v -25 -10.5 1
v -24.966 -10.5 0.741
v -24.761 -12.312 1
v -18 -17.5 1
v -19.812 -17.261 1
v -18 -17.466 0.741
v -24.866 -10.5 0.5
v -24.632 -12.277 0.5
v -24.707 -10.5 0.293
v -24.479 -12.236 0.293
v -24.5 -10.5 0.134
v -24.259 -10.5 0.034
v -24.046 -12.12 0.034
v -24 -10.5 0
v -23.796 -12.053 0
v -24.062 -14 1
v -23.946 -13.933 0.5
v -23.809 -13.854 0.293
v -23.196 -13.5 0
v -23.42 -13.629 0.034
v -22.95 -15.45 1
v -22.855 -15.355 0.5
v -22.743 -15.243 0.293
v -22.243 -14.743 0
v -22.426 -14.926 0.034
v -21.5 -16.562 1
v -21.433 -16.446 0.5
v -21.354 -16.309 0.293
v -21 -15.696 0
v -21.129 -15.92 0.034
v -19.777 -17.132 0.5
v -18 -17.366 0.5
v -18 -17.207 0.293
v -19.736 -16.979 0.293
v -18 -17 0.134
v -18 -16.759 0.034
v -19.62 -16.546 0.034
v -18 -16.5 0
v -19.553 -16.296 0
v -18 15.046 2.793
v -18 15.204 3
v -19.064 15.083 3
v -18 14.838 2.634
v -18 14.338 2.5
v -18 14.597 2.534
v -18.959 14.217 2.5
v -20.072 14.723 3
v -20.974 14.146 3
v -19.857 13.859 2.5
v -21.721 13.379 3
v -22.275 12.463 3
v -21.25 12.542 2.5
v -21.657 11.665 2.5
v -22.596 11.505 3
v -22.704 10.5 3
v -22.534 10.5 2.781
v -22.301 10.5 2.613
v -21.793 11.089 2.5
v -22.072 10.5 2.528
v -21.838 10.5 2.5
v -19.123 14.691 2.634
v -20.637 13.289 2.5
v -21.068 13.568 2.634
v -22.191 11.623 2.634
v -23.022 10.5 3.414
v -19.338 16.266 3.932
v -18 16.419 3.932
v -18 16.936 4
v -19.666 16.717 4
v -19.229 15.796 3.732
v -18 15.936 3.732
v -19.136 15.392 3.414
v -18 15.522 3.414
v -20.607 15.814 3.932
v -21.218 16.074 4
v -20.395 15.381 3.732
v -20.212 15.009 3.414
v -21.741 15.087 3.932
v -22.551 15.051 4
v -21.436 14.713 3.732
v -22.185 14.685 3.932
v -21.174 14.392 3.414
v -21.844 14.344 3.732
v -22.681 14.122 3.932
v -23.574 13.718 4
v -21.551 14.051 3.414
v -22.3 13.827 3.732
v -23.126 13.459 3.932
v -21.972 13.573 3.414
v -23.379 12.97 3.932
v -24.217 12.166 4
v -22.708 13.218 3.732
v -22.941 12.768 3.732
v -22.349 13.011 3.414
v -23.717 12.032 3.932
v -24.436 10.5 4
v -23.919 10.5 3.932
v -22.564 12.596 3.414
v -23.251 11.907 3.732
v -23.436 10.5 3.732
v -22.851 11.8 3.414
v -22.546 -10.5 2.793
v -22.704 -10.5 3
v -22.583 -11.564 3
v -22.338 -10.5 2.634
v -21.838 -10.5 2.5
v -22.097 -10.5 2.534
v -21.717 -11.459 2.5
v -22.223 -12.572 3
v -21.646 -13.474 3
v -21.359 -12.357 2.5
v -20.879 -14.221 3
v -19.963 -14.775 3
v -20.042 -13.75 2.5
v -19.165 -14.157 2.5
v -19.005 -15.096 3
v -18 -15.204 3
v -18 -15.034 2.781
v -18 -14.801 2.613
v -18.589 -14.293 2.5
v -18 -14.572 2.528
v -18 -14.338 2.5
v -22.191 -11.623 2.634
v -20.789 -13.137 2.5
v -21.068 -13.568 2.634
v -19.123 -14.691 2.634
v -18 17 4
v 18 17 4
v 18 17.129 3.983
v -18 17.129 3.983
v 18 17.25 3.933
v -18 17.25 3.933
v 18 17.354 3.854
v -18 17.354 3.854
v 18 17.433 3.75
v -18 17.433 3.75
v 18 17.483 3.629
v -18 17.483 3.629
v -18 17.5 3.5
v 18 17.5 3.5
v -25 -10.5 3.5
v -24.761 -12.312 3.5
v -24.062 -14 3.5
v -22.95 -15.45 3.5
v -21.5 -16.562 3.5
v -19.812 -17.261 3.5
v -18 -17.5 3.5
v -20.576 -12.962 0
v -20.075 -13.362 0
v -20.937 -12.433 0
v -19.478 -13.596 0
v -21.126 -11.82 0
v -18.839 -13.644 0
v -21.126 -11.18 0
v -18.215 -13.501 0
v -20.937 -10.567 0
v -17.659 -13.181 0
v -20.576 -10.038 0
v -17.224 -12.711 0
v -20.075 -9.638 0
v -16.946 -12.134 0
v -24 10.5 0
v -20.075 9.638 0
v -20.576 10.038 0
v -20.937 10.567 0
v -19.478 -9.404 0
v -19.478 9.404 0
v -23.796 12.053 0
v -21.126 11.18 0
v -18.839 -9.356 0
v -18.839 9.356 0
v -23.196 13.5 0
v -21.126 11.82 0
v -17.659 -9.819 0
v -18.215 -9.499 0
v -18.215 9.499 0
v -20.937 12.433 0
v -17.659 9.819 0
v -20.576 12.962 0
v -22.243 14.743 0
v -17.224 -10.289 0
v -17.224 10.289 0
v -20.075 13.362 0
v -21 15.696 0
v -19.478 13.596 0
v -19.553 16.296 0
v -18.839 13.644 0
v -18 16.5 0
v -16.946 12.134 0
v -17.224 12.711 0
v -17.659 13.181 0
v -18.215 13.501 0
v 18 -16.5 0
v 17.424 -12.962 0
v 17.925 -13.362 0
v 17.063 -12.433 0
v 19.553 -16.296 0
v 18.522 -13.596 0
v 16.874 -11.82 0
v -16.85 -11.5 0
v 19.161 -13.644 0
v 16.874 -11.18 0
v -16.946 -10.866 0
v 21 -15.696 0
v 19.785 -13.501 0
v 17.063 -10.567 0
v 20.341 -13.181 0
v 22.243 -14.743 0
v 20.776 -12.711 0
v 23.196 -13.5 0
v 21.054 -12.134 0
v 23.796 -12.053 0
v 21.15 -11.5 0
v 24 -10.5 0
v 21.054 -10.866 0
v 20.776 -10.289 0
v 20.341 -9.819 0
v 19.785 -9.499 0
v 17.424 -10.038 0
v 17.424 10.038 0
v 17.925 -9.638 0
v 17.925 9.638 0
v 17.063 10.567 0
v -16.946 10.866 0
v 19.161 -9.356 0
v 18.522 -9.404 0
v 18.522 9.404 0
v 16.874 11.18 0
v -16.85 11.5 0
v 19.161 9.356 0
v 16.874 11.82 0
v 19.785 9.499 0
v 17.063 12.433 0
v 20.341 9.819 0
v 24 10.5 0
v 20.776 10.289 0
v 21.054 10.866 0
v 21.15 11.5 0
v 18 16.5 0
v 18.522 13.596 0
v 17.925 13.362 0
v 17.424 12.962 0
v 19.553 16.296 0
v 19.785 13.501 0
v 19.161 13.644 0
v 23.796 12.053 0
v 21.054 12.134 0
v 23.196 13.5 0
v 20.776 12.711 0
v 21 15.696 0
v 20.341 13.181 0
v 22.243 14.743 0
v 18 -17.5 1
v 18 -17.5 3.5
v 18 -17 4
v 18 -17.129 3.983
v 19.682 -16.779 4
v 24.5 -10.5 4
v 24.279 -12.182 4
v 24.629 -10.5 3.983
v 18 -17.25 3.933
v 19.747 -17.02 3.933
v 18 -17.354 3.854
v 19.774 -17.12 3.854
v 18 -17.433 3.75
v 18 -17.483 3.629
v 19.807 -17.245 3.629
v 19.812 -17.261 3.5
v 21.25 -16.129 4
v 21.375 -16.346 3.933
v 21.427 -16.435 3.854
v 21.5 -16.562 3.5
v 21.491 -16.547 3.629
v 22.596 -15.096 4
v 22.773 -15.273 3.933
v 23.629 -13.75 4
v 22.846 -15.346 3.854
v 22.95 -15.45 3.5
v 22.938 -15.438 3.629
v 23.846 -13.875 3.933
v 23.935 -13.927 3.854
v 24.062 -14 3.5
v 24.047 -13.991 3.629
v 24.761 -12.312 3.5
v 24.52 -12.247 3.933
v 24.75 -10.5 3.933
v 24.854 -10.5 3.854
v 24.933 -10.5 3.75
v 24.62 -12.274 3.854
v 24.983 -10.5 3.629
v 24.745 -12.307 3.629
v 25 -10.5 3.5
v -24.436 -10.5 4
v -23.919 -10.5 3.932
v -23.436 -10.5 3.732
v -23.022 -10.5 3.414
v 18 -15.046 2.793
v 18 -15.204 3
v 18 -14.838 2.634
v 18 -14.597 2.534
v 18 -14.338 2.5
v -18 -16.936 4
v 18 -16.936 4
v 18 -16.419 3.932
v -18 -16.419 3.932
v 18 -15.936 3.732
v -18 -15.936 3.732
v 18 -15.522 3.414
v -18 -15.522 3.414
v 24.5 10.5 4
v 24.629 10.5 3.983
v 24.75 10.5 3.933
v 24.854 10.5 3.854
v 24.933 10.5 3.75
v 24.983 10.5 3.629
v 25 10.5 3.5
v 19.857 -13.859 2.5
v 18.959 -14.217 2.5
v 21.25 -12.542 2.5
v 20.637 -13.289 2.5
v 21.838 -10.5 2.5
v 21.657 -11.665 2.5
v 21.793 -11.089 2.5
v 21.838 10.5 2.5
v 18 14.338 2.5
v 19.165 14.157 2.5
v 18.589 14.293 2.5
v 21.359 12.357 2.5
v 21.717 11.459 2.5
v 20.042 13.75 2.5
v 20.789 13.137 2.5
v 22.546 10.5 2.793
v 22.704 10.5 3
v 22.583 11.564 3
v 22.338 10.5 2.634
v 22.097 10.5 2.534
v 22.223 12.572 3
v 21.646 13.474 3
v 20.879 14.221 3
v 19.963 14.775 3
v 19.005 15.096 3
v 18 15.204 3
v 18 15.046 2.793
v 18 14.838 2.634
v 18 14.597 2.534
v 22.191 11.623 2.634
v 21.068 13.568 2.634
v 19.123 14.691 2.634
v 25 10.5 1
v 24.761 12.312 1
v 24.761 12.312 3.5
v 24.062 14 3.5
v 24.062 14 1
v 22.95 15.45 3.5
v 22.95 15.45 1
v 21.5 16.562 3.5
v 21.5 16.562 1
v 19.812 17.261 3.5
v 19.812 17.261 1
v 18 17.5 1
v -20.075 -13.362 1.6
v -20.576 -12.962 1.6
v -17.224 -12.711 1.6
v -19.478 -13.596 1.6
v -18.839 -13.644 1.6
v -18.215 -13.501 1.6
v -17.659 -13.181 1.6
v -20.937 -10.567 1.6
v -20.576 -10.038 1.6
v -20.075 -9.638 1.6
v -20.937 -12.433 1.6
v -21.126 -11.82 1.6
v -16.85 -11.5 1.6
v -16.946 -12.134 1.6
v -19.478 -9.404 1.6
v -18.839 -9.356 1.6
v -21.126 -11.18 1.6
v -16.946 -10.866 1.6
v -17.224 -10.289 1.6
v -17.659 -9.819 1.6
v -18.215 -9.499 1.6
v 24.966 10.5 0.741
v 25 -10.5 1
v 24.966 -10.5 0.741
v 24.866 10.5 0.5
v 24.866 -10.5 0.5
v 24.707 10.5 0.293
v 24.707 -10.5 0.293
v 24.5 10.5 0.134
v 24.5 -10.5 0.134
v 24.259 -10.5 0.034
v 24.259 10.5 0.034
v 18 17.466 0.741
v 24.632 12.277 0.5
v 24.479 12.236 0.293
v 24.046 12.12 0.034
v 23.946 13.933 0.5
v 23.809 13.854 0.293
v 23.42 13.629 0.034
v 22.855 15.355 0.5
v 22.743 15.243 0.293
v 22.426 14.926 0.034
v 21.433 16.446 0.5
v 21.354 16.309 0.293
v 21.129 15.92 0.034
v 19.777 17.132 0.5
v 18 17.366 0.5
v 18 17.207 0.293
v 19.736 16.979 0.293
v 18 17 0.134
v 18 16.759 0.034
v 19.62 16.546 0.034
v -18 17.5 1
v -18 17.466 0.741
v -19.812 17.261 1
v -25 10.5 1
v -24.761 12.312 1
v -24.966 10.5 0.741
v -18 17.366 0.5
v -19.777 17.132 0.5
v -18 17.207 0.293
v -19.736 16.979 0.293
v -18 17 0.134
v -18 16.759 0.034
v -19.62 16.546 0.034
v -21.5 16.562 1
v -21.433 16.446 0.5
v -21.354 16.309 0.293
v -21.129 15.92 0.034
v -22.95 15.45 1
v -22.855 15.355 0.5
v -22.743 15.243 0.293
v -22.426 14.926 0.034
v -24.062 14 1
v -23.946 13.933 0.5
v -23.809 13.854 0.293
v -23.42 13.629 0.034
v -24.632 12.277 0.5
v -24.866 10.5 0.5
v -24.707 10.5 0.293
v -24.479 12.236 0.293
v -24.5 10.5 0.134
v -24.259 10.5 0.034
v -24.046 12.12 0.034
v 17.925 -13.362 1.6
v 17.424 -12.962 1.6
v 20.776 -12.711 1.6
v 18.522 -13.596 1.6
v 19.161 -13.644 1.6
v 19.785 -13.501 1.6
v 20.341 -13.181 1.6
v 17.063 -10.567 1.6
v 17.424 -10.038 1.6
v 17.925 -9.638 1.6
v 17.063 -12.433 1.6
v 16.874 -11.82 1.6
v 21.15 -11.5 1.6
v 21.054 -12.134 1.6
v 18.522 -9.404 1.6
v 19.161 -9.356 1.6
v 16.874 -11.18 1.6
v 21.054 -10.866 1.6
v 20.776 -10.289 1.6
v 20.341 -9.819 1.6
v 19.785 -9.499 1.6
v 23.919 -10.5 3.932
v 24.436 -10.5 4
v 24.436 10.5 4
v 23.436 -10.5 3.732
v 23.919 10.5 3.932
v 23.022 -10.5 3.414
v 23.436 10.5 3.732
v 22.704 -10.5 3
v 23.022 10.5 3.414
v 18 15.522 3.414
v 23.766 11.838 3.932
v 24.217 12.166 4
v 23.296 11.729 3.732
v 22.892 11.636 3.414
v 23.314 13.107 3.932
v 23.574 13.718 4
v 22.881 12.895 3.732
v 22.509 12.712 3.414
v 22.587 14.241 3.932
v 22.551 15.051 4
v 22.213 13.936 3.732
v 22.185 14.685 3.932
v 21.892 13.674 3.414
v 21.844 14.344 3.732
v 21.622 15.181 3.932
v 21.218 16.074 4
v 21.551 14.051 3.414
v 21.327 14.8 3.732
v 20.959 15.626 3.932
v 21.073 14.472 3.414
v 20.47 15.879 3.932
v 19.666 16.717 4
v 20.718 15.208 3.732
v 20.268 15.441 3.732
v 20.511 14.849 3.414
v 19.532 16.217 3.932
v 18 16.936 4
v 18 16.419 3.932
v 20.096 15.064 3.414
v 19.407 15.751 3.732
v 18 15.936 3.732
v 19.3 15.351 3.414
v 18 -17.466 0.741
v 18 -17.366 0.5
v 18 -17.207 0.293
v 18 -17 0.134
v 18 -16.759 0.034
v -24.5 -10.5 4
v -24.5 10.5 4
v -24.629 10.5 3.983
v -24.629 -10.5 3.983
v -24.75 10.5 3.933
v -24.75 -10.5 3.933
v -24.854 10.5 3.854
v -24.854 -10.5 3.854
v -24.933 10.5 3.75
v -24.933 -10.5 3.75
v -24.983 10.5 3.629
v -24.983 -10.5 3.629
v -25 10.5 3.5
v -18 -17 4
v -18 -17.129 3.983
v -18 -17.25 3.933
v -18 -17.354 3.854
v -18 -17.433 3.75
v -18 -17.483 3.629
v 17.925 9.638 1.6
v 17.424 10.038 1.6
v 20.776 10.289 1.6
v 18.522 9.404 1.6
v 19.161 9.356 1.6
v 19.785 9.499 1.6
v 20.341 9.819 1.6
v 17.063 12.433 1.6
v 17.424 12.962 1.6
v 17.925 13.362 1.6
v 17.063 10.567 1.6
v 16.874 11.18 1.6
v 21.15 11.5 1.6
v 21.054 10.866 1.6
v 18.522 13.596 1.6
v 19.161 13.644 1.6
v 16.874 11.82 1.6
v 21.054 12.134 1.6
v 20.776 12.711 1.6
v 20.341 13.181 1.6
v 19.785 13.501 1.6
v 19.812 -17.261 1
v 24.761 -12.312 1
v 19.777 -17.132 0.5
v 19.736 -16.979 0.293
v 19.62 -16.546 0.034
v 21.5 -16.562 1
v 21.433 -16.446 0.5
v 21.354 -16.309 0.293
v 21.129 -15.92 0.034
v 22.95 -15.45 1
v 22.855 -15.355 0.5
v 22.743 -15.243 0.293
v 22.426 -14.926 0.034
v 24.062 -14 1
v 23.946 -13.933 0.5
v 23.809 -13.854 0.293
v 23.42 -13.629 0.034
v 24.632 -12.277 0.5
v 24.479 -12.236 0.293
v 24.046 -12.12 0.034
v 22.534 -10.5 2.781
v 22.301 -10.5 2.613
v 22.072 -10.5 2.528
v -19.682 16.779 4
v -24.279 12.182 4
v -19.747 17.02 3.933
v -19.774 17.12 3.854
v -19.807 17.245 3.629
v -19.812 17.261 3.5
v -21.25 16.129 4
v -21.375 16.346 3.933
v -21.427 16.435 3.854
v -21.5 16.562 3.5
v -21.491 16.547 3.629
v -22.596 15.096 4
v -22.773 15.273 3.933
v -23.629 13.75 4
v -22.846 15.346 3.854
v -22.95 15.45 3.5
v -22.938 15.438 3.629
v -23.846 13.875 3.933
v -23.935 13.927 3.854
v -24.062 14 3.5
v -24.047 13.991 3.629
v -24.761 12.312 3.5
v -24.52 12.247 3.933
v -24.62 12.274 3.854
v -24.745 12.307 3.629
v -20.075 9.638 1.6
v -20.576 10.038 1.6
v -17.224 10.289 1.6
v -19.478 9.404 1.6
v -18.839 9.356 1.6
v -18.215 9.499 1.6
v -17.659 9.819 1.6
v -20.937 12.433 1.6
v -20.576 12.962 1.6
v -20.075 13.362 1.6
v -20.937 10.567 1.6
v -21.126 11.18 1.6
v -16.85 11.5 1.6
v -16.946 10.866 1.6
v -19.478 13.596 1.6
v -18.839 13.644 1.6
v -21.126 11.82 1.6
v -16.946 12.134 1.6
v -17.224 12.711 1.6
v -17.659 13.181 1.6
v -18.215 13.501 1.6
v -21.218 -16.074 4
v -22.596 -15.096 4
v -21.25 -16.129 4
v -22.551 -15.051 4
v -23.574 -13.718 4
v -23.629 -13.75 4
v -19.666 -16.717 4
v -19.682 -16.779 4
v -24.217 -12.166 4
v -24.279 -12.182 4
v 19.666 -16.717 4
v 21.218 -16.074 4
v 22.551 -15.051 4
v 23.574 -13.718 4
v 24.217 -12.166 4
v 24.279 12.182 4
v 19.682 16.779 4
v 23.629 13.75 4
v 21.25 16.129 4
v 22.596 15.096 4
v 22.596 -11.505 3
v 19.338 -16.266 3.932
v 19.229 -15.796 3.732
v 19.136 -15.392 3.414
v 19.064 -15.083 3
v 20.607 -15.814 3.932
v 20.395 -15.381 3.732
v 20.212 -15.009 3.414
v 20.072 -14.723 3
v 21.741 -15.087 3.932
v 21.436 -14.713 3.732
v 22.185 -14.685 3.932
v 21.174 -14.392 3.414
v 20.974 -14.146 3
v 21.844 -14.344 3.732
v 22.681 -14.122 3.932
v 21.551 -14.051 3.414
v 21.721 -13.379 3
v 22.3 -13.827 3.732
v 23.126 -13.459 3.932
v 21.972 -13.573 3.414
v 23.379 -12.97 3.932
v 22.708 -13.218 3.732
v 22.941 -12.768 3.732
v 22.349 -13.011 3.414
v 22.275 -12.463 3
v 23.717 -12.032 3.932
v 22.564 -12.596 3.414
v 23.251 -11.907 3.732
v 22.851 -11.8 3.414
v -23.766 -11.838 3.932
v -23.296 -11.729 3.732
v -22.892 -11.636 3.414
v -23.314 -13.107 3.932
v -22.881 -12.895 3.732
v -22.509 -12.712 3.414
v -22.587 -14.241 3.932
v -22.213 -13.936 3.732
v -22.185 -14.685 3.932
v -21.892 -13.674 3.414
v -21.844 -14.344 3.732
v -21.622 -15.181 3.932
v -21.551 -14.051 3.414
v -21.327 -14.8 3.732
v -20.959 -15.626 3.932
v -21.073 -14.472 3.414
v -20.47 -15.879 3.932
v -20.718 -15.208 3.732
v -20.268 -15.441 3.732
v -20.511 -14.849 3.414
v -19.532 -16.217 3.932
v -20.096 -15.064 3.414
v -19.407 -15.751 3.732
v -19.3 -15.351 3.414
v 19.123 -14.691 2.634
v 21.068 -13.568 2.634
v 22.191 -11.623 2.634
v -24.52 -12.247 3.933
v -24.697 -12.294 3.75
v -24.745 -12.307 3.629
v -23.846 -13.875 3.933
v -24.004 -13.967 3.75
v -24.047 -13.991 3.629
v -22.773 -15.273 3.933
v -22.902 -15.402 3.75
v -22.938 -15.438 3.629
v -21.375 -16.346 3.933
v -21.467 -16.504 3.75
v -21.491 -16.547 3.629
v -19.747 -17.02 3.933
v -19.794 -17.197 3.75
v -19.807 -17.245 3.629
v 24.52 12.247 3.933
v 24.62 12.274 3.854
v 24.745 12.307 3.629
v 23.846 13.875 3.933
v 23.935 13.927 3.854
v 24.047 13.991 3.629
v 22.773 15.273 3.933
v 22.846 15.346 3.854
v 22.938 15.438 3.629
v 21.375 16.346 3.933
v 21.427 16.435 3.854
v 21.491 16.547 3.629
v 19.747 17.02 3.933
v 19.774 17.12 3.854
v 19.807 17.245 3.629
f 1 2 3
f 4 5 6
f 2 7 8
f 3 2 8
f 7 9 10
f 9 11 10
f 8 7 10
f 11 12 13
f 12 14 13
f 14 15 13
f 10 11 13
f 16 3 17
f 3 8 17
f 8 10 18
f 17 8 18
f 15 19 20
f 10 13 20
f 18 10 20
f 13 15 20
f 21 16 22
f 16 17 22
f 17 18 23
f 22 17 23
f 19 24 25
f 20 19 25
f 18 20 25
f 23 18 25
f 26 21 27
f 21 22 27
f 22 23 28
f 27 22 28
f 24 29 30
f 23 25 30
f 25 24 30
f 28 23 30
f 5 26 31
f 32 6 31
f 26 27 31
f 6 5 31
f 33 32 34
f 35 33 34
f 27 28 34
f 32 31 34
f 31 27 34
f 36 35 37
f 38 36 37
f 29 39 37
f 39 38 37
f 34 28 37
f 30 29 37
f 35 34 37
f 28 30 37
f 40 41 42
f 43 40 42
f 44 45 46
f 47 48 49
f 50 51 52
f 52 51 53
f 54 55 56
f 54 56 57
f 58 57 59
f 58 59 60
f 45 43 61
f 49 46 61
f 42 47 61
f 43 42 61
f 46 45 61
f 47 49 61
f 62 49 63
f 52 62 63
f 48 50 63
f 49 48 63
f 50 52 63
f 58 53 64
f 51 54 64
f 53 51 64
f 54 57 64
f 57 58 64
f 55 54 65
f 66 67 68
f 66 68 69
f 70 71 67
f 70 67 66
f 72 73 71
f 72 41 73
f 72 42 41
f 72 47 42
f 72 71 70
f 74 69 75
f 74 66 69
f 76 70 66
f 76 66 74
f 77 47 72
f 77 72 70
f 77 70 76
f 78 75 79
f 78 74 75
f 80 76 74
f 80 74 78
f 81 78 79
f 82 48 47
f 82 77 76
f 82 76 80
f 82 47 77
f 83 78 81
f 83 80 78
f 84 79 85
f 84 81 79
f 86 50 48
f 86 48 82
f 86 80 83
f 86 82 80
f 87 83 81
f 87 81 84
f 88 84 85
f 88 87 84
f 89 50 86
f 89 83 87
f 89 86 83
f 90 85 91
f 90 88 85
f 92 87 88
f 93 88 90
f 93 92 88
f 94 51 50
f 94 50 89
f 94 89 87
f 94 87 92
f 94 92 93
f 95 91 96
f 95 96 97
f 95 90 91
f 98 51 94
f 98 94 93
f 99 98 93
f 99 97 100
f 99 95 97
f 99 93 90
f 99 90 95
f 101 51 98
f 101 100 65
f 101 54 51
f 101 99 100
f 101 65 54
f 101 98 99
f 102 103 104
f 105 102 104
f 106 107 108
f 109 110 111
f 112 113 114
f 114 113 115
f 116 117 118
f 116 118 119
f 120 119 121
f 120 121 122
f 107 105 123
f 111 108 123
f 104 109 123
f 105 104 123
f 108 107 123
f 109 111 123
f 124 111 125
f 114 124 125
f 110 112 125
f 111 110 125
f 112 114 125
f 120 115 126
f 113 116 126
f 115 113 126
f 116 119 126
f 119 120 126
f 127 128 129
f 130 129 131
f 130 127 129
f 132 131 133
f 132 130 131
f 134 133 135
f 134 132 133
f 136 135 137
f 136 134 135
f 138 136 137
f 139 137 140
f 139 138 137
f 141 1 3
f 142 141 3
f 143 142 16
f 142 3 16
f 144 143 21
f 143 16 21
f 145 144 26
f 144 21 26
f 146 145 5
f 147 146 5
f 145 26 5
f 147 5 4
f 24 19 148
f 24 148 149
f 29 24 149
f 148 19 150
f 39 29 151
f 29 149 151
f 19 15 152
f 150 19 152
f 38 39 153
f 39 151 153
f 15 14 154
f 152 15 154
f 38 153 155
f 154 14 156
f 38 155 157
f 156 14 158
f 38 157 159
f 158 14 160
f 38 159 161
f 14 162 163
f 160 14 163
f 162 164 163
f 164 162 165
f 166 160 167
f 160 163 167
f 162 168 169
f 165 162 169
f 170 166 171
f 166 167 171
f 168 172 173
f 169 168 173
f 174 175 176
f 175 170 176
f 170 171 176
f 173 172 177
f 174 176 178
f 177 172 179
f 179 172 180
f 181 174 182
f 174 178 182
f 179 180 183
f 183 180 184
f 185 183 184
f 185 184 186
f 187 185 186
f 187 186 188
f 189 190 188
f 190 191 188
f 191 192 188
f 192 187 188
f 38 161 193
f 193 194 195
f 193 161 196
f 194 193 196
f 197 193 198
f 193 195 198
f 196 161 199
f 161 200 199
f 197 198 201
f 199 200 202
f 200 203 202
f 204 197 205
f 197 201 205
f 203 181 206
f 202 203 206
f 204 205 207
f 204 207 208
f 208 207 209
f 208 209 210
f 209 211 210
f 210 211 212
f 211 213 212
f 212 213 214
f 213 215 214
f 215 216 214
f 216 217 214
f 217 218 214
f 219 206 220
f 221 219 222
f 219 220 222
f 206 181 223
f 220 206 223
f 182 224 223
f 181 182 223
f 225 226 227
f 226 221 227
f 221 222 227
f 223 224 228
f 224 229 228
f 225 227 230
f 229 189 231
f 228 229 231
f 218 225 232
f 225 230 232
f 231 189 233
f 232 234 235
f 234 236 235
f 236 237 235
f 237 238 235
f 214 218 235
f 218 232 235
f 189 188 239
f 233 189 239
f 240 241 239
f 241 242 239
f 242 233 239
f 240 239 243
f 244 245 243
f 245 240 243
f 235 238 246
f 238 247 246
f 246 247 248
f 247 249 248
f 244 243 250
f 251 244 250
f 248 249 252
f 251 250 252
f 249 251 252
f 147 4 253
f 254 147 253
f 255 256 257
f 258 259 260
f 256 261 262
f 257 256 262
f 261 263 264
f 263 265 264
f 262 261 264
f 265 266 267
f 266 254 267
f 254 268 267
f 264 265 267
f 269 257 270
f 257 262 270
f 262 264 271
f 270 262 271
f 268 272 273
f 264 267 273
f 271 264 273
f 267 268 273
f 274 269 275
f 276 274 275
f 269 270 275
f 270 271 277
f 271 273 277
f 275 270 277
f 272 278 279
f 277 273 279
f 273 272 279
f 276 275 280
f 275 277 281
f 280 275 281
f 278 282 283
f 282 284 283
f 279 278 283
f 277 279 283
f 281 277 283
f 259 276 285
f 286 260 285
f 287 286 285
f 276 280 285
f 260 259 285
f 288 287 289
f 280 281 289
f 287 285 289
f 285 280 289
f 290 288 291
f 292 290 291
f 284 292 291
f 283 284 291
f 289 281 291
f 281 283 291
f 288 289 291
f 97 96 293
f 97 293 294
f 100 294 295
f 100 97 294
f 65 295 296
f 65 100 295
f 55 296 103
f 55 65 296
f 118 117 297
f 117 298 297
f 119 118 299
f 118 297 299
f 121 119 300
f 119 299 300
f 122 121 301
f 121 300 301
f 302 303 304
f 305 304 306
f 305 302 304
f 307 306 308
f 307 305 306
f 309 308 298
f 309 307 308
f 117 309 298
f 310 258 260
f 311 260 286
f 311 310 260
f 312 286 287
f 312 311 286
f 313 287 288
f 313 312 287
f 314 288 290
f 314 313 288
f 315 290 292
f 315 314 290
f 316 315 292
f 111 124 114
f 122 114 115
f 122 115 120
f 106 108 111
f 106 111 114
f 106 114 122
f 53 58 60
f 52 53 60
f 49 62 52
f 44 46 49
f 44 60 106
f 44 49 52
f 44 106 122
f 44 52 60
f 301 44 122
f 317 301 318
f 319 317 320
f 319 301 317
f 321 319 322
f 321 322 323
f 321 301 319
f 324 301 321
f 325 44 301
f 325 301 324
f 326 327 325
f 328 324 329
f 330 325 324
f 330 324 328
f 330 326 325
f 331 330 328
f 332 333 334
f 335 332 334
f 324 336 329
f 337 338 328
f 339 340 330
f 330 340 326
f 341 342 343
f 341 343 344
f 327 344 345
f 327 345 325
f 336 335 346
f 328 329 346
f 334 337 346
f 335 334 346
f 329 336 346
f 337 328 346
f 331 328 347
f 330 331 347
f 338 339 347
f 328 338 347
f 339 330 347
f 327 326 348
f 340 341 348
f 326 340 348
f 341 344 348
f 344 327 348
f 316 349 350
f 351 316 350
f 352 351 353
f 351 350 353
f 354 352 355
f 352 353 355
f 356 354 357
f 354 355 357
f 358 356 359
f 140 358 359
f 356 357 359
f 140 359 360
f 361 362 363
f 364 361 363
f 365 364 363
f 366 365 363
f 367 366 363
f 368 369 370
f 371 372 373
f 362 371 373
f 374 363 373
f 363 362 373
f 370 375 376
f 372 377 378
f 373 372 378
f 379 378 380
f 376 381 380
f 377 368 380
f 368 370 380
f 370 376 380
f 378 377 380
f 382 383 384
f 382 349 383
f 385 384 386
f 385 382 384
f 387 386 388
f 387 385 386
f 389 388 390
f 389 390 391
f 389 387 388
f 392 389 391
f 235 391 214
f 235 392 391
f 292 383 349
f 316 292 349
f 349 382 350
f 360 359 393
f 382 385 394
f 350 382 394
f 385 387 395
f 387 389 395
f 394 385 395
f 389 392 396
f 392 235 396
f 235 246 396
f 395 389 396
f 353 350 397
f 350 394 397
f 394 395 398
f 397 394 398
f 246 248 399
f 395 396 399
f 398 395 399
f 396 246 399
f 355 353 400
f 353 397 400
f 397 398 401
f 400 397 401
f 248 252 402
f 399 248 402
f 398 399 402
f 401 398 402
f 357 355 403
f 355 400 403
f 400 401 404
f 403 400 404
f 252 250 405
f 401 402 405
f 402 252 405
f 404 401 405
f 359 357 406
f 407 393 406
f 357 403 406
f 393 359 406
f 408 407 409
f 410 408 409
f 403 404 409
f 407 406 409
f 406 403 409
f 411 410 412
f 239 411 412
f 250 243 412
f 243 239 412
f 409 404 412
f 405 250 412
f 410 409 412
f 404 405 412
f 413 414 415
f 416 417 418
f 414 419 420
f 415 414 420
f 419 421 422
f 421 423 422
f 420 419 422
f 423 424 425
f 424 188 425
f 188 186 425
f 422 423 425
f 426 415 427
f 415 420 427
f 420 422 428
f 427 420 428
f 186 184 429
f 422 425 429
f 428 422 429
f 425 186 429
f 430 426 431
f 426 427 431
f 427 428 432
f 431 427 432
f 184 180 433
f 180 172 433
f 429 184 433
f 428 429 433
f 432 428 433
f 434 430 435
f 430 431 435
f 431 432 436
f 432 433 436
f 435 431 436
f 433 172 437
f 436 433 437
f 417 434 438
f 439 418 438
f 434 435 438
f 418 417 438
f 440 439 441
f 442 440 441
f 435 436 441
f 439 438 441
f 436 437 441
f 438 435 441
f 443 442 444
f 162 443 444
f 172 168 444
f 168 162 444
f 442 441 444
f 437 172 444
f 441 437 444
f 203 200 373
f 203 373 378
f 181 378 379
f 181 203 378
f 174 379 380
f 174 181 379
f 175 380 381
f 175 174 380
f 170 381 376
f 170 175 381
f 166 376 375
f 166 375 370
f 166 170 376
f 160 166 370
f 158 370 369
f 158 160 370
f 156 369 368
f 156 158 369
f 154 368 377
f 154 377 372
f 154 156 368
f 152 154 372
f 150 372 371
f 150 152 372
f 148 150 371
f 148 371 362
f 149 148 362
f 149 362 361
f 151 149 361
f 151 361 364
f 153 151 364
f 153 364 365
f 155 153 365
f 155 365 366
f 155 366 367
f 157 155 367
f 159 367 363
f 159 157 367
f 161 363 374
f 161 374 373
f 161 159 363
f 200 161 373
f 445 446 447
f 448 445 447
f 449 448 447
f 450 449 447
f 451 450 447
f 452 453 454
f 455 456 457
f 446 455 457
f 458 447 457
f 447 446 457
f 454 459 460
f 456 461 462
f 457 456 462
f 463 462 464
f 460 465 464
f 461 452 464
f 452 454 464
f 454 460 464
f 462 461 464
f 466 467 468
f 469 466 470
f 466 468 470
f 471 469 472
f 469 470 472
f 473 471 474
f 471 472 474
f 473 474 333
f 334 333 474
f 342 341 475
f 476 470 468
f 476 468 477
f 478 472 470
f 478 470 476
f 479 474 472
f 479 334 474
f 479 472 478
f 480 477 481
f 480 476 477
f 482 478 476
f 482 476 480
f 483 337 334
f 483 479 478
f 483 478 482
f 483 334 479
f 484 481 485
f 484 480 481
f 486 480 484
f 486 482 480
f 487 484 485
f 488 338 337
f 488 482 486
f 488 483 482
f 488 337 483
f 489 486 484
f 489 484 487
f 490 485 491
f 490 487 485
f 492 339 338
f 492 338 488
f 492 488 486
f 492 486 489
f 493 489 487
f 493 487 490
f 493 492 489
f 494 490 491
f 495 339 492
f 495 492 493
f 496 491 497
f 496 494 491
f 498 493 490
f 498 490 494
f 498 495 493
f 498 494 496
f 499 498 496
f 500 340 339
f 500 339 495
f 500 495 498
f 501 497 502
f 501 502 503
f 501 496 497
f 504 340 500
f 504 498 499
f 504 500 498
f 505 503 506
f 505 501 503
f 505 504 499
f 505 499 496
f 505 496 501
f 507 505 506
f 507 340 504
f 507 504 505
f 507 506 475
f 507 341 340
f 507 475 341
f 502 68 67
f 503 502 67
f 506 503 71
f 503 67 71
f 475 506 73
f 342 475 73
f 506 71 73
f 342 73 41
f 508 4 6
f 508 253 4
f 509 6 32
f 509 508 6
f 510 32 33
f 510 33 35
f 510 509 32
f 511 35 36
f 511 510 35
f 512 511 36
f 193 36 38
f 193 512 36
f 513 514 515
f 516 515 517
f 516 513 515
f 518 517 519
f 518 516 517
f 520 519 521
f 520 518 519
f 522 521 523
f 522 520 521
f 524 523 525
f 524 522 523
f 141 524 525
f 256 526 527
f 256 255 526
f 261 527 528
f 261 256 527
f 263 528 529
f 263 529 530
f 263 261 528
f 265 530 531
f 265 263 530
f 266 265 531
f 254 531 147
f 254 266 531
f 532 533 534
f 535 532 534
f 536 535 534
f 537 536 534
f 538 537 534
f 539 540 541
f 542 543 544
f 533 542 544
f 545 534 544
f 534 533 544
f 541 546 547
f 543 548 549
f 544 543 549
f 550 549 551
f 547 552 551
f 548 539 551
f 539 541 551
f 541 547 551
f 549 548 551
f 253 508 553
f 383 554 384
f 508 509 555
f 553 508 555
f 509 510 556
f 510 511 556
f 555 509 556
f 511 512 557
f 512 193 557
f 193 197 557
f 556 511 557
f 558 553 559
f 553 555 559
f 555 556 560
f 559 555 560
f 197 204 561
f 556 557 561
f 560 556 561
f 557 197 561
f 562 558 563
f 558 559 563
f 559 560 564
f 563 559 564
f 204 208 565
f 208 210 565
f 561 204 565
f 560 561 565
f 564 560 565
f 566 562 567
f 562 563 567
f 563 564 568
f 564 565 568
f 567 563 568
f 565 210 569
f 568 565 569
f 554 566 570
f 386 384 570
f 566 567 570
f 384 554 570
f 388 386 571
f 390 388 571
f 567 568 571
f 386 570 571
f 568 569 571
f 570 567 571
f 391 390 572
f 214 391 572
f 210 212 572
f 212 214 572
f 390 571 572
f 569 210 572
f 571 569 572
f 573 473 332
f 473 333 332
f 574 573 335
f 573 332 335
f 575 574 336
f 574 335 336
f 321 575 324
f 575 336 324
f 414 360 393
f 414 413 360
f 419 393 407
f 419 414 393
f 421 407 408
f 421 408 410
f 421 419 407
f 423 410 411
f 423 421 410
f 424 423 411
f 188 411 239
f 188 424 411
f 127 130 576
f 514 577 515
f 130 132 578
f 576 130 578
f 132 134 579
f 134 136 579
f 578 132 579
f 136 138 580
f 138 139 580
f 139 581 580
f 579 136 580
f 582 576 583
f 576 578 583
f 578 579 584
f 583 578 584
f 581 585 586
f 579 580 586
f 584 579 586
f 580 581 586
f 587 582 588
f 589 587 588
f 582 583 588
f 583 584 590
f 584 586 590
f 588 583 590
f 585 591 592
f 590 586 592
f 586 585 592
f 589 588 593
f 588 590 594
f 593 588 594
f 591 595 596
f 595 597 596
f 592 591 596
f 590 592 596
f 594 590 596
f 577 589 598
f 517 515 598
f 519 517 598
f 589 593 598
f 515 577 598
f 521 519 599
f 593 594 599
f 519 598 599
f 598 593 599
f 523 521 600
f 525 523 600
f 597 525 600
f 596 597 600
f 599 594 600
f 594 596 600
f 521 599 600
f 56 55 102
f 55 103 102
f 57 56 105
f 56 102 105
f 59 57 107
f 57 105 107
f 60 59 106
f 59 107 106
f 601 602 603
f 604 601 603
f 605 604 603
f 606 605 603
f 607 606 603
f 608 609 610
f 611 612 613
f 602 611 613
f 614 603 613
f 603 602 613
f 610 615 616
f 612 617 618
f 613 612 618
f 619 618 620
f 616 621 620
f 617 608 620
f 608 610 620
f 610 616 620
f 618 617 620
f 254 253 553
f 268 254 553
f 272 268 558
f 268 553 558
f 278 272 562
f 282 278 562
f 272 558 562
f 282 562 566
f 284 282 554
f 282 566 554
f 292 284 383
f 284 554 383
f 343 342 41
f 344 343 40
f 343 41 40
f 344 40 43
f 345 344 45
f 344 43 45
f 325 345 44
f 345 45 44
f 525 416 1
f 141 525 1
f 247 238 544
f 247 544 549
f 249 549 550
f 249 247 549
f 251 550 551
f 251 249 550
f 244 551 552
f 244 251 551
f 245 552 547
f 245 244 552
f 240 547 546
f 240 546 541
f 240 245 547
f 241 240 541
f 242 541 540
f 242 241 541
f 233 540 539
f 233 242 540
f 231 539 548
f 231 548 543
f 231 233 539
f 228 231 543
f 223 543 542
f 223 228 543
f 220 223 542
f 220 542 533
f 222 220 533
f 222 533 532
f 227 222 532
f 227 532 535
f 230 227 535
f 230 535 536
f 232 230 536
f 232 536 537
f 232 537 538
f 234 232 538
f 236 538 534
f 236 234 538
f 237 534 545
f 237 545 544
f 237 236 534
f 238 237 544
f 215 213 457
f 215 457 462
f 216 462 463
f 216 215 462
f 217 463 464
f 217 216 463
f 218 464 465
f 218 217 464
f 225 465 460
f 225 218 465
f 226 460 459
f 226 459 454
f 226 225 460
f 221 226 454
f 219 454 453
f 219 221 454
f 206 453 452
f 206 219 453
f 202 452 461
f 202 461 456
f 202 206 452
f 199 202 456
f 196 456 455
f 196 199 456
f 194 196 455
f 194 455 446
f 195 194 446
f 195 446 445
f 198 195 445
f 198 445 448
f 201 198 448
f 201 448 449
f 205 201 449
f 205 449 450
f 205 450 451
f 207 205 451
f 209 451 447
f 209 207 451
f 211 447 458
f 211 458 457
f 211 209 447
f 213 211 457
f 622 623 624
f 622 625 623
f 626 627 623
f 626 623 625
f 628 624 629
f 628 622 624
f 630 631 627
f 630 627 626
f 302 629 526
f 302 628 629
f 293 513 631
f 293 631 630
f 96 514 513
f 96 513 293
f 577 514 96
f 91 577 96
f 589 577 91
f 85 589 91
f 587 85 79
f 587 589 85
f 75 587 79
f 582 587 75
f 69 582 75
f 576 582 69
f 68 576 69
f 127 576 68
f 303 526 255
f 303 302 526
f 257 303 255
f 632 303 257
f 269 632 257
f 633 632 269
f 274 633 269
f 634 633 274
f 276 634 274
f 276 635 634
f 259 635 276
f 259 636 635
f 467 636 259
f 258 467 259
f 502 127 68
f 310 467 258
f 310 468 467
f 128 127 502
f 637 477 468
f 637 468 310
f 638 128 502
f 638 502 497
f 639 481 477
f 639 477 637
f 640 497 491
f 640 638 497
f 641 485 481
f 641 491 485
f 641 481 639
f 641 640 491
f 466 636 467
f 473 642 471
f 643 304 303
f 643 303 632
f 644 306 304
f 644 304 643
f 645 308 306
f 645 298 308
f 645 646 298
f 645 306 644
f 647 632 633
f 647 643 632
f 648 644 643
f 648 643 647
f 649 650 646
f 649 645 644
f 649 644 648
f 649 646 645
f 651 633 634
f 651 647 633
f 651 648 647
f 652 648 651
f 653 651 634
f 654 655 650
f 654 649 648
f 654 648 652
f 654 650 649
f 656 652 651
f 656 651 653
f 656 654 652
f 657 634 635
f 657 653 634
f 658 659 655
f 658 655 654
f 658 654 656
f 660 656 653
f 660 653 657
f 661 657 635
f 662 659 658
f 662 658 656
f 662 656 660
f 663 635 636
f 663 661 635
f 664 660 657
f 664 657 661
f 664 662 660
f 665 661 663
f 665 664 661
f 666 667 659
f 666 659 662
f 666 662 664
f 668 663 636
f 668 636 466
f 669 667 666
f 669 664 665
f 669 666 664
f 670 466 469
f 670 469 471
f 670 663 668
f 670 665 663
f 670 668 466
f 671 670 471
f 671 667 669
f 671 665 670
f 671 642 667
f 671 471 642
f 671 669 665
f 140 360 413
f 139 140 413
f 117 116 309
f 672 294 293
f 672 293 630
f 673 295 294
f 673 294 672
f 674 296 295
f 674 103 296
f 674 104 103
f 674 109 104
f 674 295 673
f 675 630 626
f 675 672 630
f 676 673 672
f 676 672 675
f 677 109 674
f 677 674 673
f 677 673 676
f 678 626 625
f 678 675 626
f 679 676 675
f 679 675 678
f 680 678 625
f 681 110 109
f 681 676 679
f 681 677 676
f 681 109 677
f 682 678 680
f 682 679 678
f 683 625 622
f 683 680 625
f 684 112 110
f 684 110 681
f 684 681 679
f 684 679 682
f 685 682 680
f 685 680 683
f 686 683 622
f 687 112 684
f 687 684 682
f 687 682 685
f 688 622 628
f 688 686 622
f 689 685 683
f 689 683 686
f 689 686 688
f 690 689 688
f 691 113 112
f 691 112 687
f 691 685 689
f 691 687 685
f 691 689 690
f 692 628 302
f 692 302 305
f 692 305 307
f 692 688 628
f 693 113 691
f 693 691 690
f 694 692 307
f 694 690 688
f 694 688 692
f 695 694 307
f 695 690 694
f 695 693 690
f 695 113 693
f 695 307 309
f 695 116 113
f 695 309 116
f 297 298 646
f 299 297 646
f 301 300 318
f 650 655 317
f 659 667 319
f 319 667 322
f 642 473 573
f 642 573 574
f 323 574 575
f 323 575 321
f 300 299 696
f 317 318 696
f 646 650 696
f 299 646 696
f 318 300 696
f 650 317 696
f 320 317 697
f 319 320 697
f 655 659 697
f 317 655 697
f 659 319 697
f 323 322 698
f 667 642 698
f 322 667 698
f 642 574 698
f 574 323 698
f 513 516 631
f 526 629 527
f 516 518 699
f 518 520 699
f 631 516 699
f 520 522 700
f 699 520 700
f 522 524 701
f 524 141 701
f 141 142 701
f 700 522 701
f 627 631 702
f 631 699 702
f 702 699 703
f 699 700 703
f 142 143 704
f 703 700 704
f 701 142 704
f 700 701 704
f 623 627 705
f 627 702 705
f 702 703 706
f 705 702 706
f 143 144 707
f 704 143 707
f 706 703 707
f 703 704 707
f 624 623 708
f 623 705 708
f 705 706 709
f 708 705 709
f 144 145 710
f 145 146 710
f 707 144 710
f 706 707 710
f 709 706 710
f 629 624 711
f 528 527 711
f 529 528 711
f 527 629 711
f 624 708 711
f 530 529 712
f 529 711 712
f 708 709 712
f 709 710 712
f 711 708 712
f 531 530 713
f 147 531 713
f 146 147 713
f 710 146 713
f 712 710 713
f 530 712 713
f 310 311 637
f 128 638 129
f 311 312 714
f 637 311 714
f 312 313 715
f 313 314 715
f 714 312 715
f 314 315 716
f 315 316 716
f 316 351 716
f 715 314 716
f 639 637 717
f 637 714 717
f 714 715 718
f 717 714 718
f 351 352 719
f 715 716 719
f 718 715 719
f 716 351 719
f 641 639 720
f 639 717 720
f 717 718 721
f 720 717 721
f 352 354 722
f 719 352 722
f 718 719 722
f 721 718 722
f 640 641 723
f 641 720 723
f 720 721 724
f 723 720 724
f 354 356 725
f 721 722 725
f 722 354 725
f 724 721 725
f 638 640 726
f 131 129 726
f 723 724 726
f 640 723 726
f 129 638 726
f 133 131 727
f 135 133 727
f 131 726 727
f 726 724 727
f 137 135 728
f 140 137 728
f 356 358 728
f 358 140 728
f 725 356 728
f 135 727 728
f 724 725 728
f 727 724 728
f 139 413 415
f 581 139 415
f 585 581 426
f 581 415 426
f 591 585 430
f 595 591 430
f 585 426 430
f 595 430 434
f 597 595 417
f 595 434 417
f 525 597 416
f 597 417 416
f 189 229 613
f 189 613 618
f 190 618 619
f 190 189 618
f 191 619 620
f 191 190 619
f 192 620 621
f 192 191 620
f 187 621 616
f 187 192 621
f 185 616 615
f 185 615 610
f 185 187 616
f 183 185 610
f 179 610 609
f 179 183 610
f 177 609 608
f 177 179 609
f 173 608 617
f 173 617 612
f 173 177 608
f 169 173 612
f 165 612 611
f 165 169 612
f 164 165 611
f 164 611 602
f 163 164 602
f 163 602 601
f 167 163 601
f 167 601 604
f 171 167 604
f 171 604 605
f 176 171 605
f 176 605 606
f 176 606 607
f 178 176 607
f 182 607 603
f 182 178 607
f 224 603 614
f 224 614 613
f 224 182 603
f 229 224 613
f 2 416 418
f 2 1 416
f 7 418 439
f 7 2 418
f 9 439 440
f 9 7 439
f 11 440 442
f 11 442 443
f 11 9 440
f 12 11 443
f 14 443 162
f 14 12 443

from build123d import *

# Parameters (mm, degrees)
F1_DEPTH     = 4
F2_R         = 1
F3_T         = -2.5
F4_T1_DEPTH  = 36
F4_T3_DEPTH  = 21
F4_T6_ANGLE  = 90
F4_T8_ANGLE  = 90
F4_T10_ANGLE = 90
F4_T12_ANGLE = 90
F5_R         = 1
F6_R         = 0.5
F7_R         = 2.15
F8_DEPTH     = 1.6


# Not quite as in the source:
# - a fillet or chamfer that OpenCascade refuses, or shapes differently, is made with other operations: its cross-section is extruded or revolved along the edge and cut away or added


with BuildPart() as f1:
    # F0 (on Top) → F1 (new body)
    with BuildSketch(Plane.XY):
        with BuildLine():
            Line((-18, -17.5), (18, -17.5))
            ThreePointArc((18, -17.5), (22.9497474683, -15.4497474683), (25, -10.5))
            Line((25, -10.5), (25, 10.5))
            ThreePointArc((25, 10.5), (22.9497474683, 15.4497474683), (18, 17.5))
            Line((18, 17.5), (-18, 17.5))
            ThreePointArc((-18, 17.5), (-22.9497474683, 15.4497474683), (-25, 10.5))
            Line((-25, 10.5), (-25, -10.5))
            ThreePointArc((-25, -10.5), (-22.9497474683, -15.4497474683), (-18, -17.5))
        make_face()
    extrude(amount=F1_DEPTH)

    # F2
    f2_edges = [f1.edges().sort_by_distance(p)[0] for p in [
        (0, -17.5, 0),
    ]]
    fillet(f2_edges, radius=F2_R)

    # F3
    f3_openings = [f1.faces().sort_by_distance(p)[0] for p in [
        (0, 0, 4),
    ]]
    offset(amount=F3_T, openings=f3_openings)

    # F4: fillet of radius 2 on 1 edges, made by hand

    # F4_s2 → F4_t1 (cut)
    with BuildSketch(Plane.YZ.offset(-18)):
        with BuildLine():
            ThreePointArc((16.9364916731, 4), (15.7117468017, 3.5811388301), (15, 2.5))
            Line((15, 2.5), (15, 4))
            Line((15, 4), (16.9364916731, 4))
        make_face()
        with BuildLine():
            ThreePointArc((-16.9364916731, 4), (-15.7117468017, 3.5811388301), (-15, 2.5))
            Line((-15, 2.5), (-15, 4))
            Line((-15, 4), (-16.9364916731, 4))
        make_face()
    extrude(amount=F4_T1_DEPTH, mode=Mode.SUBTRACT)

    # F4_s4 → F4_t3 (cut)
    with BuildSketch(Plane.XZ.offset(-10.5)):
        with BuildLine():
            ThreePointArc((-24.4364916731, 4), (-23.2117468017, 3.5811388301), (-22.5, 2.5))
            Line((-22.5, 2.5), (-22.5, 4))
            Line((-22.5, 4), (-24.4364916731, 4))
        make_face()
        with BuildLine():
            ThreePointArc((24.4364916731, 4), (23.2117468017, 3.5811388301), (22.5, 2.5))
            Line((22.5, 2.5), (22.5, 4))
            Line((22.5, 4), (24.4364916731, 4))
        make_face()
    extrude(amount=F4_T3_DEPTH, mode=Mode.SUBTRACT)

    # F4_s5 → F4_t6 (revolve, cut)
    with BuildSketch(Plane.XZ.offset(-10.5)):
        with BuildLine():
            ThreePointArc((24.4364916731, 4), (23.2117468017, 3.5811388301), (22.5, 2.5))
            Line((22.5, 2.5), (22.5, 4))
            Line((22.5, 4), (24.4364916731, 4))
        make_face()
    revolve(axis=Axis((18, 10.5, 4), (0, 0, 1)), revolution_arc=F4_T6_ANGLE, mode=Mode.SUBTRACT)

    # F4_s7 → F4_t8 (revolve, cut)
    with BuildSketch(Plane.YZ.offset(-18)):
        with BuildLine():
            ThreePointArc((16.9364916731, 4), (15.7117468017, 3.5811388301), (15, 2.5))
            Line((15, 2.5), (15, 4))
            Line((15, 4), (16.9364916731, 4))
        make_face()
    revolve(axis=Axis((-18, 10.5, 4), (0, 0, 1)), revolution_arc=F4_T8_ANGLE, mode=Mode.SUBTRACT)

    # F4_s9 → F4_t10 (revolve, cut)
    with BuildSketch(Plane.XZ.offset(10.5)):
        with BuildLine():
            ThreePointArc((-24.4364916731, 4), (-23.2117468017, 3.5811388301), (-22.5, 2.5))
            Line((-22.5, 2.5), (-22.5, 4))
            Line((-22.5, 4), (-24.4364916731, 4))
        make_face()
    revolve(axis=Axis((-18, -10.5, 4), (0, 0, 1)), revolution_arc=F4_T10_ANGLE, mode=Mode.SUBTRACT)

    # F4_s11 → F4_t12 (revolve, cut)
    with BuildSketch(Plane.YZ.offset(18)):
        with BuildLine():
            ThreePointArc((-16.9364916731, 4), (-15.7117468017, 3.5811388301), (-15, 2.5))
            Line((-15, 2.5), (-15, 4))
            Line((-15, 4), (-16.9364916731, 4))
        make_face()
    revolve(axis=Axis((18, -10.5, 4), (0, 0, 1)), revolution_arc=F4_T12_ANGLE, mode=Mode.SUBTRACT)

    # F5
    f5_edges = [f1.edges().sort_by_distance(p)[0] for p in [
        (0, 15, 2.5),
        (0, -15, 2.5),
        (21.181981, -13.681981, 2.5),
        (22.5, 0, 2.5),
        (21.181981, 13.681981, 2.5),
        (-21.181981, 13.681981, 2.5),
        (-22.5, 0, 2.5),
        (-21.181981, -13.681981, 2.5),
    ]]
    fillet(f5_edges, radius=F5_R)

    # F6
    f6_edges = [f1.edges().sort_by_distance(p)[0] for p in [
        (0, -17.5, 4),
        (-22.949747, -15.449747, 4),
        (22.949747, -15.449747, 4),
        (-25, 0, 4),
        (25, 0, 4),
        (-22.949747, 15.449747, 4),
        (22.949747, 15.449747, 4),
        (0, 17.5, 4),
    ]]
    fillet(f6_edges, radius=F6_R)

    # F7 (on face) → F8 (cut)
    with BuildSketch(Plane.XY):
        with Locations((-19, -11.5)):
            Circle(F7_R)
        with Locations((19, -11.5)):
            Circle(F7_R)
        with Locations((-19, 11.5)):
            Circle(F7_R)
        with Locations((19, 11.5)):
            Circle(F7_R)
    extrude(amount=F8_DEPTH, mode=Mode.SUBTRACT)


solid = f1.part
